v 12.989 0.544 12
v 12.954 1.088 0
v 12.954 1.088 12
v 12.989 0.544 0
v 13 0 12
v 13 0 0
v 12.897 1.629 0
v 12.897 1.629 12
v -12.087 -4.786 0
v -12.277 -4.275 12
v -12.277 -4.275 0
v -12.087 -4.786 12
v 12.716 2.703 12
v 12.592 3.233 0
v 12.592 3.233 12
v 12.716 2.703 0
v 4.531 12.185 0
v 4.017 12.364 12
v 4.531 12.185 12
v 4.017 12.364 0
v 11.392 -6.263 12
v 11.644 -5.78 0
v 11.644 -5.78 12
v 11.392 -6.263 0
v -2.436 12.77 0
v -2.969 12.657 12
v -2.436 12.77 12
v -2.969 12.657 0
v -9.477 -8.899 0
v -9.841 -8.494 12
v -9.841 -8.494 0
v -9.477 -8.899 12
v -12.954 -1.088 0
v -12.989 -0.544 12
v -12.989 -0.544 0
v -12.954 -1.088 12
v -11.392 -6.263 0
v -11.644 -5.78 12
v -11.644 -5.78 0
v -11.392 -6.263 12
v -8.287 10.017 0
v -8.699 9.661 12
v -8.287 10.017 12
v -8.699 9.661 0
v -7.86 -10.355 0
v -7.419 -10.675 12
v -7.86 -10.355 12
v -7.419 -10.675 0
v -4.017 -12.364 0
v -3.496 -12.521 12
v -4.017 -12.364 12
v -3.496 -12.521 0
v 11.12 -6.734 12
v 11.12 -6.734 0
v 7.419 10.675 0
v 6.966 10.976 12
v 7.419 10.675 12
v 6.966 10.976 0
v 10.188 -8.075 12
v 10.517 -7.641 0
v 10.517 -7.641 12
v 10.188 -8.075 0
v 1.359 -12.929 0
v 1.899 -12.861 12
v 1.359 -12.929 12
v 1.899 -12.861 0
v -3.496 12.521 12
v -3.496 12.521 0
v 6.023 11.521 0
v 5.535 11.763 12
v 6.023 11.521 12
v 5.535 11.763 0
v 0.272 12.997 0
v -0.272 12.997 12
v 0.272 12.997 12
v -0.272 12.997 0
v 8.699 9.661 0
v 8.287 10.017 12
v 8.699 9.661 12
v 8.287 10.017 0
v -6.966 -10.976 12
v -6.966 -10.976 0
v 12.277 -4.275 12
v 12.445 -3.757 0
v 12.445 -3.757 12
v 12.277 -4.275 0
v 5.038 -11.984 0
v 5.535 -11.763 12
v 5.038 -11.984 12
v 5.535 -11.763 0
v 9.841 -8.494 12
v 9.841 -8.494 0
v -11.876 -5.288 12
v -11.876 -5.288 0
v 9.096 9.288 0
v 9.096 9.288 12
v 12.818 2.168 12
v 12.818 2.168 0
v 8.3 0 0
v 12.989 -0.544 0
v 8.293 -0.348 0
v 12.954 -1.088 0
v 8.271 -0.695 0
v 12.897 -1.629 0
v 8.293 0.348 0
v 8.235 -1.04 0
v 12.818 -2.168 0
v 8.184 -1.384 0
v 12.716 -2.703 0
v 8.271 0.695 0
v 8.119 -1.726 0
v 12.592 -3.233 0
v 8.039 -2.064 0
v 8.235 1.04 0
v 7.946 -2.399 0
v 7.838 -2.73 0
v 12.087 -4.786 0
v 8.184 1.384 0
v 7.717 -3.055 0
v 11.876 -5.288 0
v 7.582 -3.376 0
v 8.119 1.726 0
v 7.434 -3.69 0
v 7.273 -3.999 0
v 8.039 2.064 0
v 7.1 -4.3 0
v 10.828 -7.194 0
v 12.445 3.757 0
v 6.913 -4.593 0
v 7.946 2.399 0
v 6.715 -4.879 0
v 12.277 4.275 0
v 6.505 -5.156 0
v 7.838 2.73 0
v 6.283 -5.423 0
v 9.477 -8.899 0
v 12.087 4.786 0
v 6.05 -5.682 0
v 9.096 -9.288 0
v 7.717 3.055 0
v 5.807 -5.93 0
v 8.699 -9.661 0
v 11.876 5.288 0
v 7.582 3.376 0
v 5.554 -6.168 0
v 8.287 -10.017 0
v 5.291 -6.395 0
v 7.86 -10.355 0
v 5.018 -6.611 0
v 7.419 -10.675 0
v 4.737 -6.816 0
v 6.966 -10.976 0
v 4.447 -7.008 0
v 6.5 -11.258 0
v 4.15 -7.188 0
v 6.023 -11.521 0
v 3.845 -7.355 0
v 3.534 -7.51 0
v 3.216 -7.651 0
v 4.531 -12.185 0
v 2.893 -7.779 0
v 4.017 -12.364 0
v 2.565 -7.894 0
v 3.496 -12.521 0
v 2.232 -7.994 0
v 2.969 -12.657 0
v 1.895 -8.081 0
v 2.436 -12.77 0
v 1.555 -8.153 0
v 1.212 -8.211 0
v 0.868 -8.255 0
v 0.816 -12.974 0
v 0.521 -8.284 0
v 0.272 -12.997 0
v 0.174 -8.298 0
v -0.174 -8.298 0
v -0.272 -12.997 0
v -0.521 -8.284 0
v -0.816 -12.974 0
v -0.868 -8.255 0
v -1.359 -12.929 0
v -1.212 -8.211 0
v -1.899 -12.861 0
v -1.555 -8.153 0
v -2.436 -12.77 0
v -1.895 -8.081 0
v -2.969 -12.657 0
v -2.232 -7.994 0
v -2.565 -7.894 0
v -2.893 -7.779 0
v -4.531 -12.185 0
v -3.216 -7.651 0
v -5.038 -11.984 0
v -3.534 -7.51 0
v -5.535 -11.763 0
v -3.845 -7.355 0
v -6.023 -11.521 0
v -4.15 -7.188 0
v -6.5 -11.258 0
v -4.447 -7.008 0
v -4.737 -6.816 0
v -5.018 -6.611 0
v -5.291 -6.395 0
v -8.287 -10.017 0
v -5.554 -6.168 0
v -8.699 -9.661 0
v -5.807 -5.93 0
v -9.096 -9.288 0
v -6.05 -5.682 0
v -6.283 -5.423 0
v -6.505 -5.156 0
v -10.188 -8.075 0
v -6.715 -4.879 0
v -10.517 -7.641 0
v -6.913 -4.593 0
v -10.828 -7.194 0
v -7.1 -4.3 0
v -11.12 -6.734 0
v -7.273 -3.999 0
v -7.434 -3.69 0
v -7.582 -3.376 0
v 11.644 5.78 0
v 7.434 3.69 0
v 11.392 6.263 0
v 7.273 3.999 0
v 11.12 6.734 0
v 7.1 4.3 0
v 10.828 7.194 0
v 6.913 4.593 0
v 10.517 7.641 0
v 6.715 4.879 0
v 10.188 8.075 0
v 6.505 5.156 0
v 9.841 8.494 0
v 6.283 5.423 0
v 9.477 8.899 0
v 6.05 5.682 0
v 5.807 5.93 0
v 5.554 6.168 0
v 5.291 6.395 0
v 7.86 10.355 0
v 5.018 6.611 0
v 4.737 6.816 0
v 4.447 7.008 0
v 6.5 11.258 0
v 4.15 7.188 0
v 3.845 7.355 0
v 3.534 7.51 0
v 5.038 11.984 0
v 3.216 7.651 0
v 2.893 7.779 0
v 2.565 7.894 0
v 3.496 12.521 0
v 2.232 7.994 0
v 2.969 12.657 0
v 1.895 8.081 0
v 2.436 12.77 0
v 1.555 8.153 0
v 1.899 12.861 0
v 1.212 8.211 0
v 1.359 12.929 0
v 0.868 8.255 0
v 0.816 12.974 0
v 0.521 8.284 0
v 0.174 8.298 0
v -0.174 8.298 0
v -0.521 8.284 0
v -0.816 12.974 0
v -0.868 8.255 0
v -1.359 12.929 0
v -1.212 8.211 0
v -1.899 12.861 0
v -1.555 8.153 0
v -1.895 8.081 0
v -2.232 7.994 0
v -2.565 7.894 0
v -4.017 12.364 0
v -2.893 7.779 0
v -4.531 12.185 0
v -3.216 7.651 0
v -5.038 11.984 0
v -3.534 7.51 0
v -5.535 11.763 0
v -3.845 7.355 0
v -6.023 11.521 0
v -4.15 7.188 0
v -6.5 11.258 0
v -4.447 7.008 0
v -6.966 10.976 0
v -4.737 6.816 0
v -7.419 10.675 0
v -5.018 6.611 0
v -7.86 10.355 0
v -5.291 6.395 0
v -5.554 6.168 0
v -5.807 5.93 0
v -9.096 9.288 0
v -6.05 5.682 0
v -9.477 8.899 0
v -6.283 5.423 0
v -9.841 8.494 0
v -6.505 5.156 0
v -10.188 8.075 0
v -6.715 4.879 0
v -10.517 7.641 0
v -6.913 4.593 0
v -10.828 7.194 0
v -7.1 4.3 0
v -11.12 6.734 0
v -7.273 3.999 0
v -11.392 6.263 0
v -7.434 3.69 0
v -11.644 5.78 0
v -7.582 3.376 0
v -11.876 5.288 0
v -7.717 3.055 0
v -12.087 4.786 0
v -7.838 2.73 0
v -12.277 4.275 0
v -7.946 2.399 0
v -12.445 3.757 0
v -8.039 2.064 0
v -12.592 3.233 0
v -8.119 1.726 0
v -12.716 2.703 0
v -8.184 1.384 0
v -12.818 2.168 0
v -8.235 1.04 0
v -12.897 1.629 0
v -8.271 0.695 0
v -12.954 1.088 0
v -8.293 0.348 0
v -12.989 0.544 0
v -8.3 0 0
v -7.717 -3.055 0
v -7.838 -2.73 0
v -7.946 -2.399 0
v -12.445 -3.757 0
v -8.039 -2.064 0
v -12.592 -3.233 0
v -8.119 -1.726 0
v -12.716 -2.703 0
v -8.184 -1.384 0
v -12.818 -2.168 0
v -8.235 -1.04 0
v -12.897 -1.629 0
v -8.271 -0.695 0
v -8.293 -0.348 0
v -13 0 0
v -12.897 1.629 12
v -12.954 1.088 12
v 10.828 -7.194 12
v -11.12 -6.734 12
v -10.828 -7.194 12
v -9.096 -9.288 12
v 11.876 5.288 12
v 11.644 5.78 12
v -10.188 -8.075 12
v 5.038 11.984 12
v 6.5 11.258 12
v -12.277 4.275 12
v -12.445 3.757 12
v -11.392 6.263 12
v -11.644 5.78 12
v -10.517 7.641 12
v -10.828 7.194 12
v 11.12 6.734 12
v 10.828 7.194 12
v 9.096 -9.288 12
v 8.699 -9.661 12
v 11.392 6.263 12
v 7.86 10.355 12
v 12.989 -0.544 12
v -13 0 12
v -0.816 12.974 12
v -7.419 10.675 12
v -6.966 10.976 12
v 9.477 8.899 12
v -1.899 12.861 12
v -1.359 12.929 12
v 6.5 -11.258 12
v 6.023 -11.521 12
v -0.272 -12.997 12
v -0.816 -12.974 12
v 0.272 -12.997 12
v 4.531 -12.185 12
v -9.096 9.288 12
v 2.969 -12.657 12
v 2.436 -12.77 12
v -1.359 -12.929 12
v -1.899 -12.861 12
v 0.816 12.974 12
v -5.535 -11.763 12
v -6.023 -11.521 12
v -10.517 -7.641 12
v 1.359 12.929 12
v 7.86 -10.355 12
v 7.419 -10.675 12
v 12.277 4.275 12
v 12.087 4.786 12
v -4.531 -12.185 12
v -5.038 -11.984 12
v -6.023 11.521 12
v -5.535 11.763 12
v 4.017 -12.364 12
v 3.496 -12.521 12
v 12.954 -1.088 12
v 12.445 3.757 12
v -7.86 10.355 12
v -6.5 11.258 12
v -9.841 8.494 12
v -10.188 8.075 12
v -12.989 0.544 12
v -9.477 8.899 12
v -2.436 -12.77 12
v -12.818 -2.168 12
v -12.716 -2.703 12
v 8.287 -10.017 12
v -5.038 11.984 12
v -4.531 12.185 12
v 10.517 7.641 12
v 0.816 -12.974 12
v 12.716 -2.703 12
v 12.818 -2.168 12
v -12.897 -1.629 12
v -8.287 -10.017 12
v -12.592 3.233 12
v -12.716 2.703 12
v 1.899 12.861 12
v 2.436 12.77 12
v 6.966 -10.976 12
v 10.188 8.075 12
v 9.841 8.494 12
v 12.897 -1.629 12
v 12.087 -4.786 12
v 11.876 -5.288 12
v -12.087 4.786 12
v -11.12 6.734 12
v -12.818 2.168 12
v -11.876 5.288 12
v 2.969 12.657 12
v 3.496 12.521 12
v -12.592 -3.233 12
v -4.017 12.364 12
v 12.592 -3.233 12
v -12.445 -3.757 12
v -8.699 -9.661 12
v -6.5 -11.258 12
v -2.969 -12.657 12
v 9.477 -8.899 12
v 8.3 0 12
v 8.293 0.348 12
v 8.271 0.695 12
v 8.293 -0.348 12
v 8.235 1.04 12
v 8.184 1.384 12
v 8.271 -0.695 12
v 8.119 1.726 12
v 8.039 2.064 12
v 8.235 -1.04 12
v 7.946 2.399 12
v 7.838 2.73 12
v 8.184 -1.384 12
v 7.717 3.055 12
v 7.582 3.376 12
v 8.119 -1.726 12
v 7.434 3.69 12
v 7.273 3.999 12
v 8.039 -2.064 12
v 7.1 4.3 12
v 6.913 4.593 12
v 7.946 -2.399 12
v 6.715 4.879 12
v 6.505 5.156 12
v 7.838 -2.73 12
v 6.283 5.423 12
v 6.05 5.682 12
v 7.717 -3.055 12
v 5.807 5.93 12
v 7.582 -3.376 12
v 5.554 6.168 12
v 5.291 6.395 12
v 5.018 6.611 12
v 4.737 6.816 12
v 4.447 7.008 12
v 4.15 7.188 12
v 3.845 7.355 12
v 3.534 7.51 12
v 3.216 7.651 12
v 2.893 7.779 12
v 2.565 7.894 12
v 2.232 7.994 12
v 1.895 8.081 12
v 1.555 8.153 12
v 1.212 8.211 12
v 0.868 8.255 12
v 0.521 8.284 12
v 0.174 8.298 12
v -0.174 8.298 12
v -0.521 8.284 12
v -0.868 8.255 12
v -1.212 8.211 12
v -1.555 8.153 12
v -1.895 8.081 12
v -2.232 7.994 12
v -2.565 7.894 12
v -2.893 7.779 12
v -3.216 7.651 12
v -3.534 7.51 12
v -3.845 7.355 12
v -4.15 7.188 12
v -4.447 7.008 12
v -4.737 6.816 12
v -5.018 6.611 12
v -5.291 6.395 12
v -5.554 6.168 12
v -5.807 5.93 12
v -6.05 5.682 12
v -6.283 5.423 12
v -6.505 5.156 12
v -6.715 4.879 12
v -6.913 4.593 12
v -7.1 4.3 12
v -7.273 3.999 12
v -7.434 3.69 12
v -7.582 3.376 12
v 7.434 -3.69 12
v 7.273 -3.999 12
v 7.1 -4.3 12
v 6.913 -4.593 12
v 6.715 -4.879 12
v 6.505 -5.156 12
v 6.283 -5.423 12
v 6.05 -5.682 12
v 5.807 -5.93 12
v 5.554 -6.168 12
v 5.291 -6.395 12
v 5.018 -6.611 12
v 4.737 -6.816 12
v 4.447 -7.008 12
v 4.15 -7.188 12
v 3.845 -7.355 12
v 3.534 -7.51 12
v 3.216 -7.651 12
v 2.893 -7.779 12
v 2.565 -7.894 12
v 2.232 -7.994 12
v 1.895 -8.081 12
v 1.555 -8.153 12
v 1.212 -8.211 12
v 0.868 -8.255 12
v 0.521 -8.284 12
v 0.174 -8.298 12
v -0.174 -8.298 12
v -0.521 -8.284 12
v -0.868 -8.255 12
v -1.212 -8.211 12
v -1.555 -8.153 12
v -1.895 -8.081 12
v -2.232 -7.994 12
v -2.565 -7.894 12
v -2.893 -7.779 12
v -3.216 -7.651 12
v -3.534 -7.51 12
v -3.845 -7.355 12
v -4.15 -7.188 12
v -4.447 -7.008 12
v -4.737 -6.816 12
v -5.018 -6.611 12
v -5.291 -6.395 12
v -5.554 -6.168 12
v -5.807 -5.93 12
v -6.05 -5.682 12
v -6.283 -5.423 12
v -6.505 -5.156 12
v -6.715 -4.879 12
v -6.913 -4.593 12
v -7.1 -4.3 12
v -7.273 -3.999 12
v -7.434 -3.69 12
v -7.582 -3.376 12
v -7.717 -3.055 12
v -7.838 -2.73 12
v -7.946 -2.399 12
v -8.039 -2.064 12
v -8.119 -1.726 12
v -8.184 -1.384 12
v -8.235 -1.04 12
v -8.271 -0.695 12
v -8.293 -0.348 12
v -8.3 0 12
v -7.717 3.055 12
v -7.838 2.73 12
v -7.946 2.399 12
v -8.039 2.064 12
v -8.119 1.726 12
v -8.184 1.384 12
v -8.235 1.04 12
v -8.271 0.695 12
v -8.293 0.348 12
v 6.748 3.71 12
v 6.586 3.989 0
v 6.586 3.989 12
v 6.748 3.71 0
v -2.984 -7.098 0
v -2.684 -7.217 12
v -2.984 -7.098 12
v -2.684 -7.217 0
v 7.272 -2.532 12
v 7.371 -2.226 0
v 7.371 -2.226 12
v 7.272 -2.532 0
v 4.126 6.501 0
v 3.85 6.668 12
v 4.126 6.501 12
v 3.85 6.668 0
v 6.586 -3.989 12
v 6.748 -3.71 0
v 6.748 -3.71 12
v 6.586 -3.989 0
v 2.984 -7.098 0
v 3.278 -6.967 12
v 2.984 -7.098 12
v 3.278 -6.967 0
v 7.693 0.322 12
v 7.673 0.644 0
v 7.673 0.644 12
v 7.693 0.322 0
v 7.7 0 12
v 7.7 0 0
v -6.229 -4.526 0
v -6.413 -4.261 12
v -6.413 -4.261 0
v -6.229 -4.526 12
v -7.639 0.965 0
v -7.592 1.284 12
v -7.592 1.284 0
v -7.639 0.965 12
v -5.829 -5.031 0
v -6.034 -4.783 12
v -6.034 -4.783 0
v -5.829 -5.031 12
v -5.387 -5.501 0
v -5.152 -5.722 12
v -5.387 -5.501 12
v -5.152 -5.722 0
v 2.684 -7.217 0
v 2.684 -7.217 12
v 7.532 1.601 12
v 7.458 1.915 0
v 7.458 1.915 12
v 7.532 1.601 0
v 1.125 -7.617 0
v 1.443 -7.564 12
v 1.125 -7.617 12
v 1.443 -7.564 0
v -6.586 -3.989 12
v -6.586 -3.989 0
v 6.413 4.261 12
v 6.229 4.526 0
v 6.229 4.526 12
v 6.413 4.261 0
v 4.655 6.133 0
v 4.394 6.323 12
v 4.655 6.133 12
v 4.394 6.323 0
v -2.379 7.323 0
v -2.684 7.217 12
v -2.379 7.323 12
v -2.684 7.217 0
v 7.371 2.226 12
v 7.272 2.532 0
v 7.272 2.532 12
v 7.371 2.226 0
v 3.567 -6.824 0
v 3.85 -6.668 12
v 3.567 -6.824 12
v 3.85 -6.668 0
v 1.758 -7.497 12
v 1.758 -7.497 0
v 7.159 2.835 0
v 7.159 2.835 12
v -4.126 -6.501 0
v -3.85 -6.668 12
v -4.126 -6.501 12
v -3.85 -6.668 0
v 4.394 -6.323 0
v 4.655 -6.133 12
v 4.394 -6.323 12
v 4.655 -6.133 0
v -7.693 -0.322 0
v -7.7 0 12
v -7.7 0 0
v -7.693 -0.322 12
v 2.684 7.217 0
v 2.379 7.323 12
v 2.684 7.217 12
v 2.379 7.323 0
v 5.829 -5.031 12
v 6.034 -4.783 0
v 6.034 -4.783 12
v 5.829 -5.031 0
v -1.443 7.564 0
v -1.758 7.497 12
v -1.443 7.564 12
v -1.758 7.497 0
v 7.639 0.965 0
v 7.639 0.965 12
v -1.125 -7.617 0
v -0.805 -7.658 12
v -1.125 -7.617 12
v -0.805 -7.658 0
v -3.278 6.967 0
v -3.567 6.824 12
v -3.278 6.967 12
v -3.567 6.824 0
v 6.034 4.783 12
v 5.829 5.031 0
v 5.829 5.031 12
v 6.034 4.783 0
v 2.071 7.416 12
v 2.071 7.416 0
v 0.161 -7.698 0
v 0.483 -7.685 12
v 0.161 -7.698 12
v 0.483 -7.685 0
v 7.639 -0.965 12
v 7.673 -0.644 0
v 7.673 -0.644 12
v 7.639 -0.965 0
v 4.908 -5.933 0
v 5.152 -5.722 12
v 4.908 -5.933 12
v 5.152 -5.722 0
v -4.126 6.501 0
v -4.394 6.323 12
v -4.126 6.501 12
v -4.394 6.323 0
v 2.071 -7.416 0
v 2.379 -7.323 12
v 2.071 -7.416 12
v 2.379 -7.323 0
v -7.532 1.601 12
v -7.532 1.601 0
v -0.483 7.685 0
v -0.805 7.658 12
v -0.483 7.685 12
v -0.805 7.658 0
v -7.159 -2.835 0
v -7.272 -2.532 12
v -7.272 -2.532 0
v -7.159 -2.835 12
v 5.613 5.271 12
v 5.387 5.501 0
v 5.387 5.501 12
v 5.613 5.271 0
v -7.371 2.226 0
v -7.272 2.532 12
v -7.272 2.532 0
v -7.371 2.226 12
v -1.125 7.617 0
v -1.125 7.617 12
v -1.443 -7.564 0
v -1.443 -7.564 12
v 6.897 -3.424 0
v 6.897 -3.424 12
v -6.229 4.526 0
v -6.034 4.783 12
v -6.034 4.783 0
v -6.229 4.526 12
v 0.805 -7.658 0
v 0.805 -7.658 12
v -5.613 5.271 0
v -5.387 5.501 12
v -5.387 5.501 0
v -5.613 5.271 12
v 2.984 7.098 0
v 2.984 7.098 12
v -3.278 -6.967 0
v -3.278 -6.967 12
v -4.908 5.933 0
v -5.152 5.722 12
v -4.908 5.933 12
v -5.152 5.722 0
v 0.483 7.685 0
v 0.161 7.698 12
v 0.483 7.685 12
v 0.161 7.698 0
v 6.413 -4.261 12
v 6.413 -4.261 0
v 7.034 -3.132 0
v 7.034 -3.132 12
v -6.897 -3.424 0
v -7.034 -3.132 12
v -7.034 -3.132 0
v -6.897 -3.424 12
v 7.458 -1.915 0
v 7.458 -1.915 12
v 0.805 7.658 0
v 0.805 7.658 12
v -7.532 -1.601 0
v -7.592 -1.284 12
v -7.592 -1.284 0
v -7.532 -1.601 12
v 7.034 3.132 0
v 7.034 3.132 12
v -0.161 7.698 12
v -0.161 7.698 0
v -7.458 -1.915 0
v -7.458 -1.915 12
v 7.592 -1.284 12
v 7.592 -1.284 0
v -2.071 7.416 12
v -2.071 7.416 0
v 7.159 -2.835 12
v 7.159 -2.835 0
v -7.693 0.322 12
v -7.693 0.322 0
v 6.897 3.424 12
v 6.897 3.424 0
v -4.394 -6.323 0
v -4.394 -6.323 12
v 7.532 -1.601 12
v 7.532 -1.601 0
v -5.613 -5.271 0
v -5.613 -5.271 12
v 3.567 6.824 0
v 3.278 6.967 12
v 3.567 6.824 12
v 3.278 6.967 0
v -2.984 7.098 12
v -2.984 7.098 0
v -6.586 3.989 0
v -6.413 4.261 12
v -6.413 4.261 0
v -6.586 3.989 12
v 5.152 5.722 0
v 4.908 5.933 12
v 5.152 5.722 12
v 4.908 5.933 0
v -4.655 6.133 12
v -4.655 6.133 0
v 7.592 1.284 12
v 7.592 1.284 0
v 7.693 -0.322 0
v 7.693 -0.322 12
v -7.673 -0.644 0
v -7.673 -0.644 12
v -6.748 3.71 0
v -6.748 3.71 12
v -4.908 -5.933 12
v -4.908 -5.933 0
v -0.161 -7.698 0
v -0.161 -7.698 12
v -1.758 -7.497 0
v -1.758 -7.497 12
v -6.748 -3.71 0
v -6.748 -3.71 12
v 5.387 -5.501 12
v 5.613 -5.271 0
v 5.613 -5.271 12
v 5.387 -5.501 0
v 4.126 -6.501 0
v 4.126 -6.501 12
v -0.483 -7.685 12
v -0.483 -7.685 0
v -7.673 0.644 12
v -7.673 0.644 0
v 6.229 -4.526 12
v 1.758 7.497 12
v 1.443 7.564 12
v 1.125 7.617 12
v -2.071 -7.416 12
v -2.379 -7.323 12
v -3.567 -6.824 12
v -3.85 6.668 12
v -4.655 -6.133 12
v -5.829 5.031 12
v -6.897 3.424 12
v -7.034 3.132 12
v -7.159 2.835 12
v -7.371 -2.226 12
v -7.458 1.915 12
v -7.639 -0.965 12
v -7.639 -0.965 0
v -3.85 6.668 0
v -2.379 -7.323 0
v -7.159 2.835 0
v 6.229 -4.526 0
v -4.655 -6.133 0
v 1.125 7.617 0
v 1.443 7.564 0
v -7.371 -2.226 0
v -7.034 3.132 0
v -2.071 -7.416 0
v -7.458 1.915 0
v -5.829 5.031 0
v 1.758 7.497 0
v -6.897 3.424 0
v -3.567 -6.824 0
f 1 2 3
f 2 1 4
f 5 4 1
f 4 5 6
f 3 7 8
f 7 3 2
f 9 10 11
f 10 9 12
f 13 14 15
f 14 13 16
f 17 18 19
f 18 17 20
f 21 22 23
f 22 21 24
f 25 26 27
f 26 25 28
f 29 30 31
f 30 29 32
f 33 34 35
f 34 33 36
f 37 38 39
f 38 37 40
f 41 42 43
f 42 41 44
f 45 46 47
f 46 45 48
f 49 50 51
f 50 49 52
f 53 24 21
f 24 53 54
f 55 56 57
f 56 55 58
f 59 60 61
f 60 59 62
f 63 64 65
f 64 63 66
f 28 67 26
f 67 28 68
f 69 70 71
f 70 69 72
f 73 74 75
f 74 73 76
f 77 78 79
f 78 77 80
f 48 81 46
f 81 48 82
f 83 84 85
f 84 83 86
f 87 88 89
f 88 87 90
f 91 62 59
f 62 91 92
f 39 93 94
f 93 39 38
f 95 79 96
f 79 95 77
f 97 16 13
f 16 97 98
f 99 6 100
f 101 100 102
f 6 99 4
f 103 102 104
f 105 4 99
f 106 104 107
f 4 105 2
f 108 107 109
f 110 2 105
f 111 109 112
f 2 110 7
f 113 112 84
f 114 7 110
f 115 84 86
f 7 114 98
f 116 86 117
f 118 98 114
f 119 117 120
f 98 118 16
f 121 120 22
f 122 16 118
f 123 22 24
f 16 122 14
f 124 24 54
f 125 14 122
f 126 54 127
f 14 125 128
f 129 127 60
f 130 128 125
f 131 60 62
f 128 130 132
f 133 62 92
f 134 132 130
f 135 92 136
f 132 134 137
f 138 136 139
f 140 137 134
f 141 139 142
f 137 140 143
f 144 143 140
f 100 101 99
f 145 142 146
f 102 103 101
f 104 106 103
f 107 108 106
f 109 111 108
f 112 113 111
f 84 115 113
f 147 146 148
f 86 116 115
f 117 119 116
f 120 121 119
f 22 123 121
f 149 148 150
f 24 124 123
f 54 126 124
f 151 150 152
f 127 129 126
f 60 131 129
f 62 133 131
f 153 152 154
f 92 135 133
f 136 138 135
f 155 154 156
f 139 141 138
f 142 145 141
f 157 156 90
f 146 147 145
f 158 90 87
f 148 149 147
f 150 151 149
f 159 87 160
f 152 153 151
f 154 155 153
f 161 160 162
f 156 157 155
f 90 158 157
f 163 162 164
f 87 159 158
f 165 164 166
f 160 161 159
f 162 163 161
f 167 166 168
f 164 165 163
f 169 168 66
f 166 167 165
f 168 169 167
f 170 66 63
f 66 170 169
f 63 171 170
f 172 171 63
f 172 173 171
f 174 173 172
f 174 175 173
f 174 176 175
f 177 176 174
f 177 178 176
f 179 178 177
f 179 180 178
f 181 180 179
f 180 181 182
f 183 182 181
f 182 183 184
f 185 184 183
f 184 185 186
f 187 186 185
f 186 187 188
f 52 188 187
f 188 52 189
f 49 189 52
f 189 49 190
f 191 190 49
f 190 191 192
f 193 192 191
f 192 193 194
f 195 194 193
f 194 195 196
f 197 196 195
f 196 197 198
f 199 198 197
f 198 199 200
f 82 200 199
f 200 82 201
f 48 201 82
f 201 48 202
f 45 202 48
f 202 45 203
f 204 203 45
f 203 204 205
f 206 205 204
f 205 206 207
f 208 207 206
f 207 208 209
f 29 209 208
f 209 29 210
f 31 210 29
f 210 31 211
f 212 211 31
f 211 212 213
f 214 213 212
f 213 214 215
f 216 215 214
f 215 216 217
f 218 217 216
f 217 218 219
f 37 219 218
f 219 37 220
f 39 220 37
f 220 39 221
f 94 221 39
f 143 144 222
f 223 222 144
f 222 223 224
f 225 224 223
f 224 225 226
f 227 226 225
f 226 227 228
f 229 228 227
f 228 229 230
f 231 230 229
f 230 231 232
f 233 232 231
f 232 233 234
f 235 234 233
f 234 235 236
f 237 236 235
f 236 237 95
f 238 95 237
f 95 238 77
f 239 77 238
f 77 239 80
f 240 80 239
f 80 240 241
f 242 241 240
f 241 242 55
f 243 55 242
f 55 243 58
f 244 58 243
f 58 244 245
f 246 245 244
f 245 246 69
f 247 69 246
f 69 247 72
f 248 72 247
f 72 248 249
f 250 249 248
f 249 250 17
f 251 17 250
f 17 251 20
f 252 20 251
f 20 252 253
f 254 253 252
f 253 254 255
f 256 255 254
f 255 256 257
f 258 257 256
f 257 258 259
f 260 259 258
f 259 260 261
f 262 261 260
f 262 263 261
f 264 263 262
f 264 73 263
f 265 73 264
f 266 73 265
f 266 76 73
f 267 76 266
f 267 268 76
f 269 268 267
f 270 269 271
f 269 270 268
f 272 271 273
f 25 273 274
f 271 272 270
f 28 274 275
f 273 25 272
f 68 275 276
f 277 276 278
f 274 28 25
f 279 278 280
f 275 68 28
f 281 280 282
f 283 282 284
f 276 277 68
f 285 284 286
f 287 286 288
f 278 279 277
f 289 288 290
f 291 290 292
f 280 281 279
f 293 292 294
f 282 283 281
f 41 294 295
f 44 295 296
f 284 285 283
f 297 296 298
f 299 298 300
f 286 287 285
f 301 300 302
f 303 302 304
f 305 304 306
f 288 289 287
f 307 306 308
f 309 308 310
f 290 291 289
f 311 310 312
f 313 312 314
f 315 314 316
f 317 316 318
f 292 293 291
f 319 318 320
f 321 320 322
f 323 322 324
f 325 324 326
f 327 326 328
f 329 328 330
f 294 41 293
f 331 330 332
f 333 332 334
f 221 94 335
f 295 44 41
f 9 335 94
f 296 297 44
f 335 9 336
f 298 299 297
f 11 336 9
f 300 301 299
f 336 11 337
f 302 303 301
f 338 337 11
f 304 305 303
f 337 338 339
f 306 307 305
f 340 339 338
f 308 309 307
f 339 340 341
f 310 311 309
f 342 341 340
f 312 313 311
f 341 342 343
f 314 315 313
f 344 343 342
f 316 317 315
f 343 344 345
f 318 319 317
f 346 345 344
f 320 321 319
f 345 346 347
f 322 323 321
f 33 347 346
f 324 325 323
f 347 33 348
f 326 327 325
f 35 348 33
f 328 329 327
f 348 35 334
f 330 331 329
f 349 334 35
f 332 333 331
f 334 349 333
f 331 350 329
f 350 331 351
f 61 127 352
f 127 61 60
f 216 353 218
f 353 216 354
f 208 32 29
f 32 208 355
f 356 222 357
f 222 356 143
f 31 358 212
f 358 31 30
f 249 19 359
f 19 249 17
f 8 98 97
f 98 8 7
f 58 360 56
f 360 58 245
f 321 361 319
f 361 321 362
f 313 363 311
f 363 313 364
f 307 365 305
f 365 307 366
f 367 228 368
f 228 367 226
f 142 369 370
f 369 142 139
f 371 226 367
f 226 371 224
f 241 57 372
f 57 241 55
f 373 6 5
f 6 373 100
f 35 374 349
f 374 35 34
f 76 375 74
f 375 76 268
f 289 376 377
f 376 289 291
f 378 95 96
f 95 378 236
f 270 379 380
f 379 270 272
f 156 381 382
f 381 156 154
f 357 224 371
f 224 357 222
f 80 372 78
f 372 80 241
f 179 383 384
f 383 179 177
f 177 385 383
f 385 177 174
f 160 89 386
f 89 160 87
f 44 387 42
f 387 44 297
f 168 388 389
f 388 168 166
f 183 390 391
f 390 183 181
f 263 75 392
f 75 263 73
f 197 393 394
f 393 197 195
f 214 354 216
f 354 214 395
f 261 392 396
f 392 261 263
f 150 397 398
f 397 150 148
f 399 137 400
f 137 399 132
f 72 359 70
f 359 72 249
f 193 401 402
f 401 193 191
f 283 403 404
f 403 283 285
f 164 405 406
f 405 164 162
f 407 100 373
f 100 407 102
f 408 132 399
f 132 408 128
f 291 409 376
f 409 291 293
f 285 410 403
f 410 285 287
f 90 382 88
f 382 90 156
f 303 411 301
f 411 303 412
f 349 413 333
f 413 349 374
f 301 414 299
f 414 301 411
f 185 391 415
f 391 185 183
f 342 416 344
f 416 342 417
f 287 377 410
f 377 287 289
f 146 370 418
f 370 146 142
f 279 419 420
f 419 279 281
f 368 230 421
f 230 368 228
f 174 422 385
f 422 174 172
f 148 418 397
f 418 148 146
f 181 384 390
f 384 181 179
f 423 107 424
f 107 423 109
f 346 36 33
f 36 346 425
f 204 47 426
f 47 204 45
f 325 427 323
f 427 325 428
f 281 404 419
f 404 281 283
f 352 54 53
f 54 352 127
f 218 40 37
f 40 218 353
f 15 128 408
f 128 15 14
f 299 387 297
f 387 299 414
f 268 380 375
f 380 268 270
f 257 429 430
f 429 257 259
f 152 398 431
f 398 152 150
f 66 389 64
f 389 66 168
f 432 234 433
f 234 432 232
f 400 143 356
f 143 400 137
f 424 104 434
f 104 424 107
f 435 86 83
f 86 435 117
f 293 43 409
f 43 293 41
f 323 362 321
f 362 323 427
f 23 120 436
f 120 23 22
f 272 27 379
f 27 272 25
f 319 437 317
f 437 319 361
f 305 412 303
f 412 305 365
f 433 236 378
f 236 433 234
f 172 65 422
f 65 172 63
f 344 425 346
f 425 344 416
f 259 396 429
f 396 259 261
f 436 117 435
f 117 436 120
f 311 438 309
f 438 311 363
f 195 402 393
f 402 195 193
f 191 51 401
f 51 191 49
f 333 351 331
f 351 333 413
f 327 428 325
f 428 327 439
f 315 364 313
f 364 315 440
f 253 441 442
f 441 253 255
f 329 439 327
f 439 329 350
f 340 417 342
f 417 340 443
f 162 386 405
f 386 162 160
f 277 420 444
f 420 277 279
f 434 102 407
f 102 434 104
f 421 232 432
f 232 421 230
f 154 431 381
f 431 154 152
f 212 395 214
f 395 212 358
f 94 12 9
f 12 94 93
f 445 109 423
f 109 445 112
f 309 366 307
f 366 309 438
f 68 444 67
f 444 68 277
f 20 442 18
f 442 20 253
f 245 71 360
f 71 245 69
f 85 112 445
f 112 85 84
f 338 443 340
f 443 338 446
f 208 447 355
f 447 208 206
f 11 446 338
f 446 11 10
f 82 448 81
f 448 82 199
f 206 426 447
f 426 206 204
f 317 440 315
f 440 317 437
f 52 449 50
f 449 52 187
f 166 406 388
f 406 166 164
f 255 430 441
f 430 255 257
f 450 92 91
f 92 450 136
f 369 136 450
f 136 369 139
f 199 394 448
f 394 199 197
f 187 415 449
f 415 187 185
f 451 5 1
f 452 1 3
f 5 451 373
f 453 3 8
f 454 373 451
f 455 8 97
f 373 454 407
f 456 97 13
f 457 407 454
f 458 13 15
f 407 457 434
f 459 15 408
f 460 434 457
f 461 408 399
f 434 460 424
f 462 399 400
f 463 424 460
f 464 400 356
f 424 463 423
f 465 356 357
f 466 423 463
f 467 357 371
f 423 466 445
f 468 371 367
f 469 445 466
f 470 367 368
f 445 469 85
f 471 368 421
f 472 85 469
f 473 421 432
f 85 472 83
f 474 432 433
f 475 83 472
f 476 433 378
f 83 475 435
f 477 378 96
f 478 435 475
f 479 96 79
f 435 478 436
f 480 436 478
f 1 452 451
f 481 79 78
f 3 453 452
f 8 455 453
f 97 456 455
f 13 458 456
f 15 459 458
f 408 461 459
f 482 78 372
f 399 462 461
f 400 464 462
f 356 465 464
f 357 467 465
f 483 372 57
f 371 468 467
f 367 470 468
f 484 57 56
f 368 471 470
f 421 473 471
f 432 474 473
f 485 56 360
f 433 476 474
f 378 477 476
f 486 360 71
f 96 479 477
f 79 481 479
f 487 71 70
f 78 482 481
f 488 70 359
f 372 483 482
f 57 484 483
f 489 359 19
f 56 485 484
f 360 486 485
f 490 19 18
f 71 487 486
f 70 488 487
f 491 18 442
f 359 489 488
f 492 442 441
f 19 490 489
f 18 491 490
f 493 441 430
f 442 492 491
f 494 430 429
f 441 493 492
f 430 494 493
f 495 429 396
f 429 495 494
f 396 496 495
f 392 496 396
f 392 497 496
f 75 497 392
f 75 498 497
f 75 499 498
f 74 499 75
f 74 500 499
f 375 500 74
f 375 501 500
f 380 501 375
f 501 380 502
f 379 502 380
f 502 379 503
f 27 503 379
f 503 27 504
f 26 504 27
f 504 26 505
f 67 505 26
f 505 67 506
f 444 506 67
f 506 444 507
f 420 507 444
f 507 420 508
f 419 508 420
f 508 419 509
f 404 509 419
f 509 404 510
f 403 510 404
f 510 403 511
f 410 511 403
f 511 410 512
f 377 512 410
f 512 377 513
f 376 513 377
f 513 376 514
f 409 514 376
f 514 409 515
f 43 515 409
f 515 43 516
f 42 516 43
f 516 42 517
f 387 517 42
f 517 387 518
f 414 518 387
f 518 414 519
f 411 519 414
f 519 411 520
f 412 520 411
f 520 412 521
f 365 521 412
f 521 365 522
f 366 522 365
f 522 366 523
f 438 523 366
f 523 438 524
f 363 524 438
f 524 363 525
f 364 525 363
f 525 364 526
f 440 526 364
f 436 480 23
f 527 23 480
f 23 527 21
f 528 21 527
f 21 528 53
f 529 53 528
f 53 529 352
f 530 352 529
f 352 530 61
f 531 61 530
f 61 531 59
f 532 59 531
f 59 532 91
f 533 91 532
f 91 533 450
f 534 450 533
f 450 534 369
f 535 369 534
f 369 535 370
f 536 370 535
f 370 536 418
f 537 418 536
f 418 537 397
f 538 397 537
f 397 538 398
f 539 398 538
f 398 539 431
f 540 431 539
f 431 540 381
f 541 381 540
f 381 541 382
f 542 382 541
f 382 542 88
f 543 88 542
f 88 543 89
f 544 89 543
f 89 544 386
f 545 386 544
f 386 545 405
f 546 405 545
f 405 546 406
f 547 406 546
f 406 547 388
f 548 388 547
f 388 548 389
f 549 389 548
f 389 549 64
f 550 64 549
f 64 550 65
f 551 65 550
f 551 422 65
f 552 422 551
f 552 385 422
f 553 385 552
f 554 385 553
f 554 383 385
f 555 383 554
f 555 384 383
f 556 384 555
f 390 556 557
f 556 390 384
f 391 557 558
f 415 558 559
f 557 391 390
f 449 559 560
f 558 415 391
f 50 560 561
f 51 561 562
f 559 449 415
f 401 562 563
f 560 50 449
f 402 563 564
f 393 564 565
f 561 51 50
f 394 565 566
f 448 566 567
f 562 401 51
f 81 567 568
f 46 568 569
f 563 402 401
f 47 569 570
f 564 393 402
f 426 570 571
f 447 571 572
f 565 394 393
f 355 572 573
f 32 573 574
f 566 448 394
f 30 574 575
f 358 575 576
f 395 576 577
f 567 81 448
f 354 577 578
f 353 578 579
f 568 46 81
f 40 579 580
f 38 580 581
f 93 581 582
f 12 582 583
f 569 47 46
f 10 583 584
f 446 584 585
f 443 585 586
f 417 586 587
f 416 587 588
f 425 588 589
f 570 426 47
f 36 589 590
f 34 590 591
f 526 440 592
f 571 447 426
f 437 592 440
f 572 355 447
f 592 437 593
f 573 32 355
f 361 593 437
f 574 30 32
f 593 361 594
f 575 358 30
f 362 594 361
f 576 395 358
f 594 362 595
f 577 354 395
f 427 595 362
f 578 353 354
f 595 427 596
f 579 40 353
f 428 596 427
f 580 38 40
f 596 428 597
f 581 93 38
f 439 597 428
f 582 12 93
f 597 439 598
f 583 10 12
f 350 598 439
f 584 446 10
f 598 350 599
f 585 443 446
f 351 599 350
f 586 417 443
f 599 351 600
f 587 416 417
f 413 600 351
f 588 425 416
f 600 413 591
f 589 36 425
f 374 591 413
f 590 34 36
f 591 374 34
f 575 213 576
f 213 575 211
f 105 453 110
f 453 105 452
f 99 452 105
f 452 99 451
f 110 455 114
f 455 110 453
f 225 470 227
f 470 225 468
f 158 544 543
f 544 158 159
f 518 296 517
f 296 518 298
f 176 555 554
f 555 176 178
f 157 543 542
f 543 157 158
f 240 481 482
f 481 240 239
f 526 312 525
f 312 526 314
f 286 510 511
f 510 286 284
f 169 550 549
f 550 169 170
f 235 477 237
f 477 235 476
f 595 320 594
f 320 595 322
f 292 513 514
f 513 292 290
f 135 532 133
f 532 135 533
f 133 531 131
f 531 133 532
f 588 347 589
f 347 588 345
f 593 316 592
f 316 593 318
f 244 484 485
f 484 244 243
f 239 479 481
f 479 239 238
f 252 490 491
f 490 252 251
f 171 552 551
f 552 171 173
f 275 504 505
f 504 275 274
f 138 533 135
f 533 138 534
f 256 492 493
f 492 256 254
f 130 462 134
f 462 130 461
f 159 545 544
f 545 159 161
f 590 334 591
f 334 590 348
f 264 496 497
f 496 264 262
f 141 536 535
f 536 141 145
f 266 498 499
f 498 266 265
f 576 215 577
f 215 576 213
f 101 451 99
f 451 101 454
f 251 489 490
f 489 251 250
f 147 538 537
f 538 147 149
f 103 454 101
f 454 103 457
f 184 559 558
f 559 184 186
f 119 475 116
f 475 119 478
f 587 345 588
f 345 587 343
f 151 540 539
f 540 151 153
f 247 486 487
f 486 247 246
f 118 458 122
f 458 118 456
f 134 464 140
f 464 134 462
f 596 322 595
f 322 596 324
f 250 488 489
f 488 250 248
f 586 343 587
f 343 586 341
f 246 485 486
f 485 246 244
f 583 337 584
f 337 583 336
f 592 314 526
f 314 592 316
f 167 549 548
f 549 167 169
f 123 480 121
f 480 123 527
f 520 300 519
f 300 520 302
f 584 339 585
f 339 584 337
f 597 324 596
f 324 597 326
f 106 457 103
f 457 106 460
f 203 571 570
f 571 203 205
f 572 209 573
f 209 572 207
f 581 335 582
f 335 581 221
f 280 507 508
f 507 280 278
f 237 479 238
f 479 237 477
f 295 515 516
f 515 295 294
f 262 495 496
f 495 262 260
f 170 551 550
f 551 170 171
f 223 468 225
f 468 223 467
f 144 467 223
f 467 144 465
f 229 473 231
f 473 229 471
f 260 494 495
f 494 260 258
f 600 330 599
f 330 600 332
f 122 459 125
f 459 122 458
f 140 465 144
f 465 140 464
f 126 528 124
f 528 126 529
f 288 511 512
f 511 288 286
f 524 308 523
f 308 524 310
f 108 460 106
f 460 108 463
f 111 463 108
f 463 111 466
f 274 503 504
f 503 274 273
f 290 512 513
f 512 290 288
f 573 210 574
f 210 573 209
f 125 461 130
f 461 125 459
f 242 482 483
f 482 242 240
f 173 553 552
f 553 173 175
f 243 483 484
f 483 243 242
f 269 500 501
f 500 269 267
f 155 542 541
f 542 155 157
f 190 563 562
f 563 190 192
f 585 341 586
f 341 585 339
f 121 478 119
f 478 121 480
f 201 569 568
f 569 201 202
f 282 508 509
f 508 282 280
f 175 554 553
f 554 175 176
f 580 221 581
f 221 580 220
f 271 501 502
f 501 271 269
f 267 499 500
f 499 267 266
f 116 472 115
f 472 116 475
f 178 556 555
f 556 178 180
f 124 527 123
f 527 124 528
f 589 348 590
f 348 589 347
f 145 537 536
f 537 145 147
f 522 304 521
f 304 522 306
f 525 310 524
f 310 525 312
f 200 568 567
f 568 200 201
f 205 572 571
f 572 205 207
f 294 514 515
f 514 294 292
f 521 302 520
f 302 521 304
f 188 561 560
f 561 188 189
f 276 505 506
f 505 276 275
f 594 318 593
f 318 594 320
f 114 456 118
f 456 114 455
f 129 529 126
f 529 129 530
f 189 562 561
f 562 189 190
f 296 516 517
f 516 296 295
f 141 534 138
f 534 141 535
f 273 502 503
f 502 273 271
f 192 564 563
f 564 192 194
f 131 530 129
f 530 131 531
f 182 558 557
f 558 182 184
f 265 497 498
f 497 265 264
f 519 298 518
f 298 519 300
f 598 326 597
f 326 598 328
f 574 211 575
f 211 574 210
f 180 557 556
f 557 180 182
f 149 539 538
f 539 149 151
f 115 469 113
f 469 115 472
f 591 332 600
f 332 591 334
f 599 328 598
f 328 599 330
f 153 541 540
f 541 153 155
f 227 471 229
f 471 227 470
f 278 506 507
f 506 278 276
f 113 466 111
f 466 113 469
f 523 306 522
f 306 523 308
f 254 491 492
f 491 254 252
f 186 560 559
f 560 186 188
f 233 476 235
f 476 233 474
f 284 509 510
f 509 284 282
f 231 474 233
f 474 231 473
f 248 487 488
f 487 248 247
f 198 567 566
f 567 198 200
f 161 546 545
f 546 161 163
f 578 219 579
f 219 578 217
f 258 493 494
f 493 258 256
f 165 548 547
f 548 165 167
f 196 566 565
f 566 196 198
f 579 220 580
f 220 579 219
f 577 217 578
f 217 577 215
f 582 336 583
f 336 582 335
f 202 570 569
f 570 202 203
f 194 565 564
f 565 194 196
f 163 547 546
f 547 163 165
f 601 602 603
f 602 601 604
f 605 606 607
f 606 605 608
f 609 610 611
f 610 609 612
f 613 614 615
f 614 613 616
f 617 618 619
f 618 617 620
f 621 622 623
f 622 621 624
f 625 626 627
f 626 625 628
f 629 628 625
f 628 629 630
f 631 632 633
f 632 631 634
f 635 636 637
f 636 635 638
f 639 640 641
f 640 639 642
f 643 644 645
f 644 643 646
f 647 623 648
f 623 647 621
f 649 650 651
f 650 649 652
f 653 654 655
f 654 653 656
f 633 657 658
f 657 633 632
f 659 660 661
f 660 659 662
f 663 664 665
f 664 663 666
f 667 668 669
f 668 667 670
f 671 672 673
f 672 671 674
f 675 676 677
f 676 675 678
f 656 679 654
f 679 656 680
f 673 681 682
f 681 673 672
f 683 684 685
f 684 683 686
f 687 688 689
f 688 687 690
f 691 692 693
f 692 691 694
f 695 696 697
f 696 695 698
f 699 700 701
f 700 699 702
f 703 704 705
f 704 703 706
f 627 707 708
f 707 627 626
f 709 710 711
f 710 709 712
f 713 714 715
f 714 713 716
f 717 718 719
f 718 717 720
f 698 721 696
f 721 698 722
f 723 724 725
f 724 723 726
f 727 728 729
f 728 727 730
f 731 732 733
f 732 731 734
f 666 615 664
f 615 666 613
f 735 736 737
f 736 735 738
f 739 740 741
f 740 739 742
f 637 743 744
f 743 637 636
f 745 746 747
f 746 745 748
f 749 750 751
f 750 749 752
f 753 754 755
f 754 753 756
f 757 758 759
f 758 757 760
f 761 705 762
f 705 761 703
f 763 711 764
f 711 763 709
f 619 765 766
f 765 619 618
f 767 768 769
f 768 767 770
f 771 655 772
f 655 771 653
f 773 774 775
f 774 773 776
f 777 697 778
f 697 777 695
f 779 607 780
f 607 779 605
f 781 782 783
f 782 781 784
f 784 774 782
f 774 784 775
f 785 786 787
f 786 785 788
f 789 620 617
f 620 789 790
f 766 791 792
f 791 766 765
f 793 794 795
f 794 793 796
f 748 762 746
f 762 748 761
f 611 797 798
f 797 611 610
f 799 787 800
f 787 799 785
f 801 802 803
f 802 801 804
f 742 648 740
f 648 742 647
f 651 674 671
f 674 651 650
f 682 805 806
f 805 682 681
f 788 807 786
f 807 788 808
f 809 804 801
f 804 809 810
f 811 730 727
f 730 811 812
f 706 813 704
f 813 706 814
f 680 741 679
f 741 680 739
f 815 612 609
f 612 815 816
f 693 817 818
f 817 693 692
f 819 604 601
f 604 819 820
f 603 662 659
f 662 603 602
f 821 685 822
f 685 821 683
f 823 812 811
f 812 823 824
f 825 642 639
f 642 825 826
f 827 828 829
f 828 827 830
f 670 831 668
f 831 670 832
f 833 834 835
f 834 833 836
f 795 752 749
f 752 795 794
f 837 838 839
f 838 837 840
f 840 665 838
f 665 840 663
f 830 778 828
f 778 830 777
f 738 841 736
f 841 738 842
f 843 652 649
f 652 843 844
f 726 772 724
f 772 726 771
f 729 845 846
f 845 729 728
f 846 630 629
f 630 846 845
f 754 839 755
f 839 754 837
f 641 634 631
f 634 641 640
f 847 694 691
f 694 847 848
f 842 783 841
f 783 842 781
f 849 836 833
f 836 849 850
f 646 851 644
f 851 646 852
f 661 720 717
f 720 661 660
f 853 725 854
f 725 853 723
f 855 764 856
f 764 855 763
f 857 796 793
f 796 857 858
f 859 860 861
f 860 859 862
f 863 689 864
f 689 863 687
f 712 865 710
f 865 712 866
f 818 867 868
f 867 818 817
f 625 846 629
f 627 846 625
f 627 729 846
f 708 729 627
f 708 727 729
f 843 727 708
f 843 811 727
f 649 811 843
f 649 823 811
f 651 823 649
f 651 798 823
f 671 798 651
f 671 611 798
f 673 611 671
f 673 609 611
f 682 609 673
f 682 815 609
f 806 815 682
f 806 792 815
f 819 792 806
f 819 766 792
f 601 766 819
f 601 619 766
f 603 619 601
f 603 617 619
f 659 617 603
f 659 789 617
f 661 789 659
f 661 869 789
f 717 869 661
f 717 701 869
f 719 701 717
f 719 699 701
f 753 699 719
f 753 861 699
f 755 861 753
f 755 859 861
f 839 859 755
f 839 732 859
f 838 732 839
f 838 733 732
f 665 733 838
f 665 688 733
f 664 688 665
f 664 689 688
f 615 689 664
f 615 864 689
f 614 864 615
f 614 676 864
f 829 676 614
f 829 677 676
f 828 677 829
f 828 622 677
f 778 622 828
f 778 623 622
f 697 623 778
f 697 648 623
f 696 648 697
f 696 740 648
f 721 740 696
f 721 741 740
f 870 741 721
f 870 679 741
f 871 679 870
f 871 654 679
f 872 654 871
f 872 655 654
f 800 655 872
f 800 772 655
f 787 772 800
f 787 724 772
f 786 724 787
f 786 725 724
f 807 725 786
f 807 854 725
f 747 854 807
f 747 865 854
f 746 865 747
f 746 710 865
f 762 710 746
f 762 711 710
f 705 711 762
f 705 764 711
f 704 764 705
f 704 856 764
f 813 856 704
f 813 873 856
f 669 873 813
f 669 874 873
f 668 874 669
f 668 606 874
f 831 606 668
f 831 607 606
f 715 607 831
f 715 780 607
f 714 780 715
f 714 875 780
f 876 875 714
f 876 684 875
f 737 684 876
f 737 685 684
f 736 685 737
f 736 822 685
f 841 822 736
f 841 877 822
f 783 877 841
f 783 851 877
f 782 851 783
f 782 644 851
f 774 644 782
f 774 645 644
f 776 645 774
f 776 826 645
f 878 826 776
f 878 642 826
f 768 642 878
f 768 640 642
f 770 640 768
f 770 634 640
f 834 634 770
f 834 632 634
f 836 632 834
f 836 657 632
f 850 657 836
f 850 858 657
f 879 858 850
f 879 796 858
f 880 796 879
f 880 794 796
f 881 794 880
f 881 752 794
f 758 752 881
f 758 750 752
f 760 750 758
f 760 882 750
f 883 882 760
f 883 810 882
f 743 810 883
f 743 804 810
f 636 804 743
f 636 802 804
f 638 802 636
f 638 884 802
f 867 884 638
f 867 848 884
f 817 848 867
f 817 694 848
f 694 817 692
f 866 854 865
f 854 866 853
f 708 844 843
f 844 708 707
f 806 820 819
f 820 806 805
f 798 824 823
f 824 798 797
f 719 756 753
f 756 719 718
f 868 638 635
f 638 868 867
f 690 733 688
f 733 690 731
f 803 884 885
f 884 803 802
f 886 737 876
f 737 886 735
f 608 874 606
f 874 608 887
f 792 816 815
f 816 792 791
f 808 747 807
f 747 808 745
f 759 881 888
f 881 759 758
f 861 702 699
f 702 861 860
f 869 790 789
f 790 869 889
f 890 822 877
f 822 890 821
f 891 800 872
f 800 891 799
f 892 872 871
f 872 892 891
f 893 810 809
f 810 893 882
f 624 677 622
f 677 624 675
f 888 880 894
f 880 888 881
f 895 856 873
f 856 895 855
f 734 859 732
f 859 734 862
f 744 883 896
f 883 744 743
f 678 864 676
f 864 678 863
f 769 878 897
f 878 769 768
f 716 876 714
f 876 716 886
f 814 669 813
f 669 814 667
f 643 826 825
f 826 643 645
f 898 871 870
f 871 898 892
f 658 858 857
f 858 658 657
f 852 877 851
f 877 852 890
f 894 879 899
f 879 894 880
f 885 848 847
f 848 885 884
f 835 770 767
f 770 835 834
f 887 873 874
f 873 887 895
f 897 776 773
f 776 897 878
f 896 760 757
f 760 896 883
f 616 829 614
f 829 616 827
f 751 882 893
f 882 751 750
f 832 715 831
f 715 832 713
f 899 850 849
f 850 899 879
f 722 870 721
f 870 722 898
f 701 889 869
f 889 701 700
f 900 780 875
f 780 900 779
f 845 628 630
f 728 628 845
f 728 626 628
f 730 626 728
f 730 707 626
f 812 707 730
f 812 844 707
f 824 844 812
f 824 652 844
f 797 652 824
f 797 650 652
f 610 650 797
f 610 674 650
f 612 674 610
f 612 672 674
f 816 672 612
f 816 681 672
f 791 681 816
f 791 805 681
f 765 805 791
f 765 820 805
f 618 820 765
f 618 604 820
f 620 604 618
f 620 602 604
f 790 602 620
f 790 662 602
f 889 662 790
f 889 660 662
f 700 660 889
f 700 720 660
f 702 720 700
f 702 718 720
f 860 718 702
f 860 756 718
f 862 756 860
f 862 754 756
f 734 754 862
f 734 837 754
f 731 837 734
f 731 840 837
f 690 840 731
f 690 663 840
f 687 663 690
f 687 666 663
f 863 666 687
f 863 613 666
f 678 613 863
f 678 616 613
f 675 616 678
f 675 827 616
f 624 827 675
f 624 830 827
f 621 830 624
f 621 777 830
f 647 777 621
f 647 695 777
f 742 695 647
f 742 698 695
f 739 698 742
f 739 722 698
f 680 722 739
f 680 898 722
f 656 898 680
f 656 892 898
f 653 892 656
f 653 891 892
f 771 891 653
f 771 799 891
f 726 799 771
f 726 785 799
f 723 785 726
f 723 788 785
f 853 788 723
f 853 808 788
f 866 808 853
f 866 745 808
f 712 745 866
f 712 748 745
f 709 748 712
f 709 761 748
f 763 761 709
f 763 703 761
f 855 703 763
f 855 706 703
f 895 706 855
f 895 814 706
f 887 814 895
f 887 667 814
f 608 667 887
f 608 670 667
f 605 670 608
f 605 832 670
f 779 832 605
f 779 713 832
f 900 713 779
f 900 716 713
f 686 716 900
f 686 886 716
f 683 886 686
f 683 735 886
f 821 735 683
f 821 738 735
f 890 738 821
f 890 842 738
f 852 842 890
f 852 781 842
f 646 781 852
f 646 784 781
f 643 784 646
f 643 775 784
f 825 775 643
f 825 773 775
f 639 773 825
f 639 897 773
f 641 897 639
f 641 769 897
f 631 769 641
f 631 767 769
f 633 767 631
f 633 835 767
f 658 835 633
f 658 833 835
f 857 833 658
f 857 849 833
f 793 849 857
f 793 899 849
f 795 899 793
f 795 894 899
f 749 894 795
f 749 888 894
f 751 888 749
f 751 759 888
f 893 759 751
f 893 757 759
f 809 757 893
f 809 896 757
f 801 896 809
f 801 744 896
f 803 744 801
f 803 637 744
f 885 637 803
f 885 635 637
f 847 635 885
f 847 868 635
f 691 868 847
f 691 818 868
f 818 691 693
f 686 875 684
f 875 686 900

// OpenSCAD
// Die for pressing small bearings in and out of fixtures.
$fn = 150;

// Outer diameter of the bearing.
bearing_outer_diameter = 16.0;

// Height of the bearing press (a bit bigger than the bearing width).
press_height = 12.0;

// Clearenence so that the printer parts separate.
clearance = 0.6;

difference()
{
    cylinder(r=(bearing_outer_diameter/2)+5, h=press_height);

    translate([0, 0, -0.1])
        cylinder(r=(bearing_outer_diameter+clearance)/2, h=press_height+0.2);
}

cylinder(r=(bearing_outer_diameter-clearance)/2, h=press_height);
